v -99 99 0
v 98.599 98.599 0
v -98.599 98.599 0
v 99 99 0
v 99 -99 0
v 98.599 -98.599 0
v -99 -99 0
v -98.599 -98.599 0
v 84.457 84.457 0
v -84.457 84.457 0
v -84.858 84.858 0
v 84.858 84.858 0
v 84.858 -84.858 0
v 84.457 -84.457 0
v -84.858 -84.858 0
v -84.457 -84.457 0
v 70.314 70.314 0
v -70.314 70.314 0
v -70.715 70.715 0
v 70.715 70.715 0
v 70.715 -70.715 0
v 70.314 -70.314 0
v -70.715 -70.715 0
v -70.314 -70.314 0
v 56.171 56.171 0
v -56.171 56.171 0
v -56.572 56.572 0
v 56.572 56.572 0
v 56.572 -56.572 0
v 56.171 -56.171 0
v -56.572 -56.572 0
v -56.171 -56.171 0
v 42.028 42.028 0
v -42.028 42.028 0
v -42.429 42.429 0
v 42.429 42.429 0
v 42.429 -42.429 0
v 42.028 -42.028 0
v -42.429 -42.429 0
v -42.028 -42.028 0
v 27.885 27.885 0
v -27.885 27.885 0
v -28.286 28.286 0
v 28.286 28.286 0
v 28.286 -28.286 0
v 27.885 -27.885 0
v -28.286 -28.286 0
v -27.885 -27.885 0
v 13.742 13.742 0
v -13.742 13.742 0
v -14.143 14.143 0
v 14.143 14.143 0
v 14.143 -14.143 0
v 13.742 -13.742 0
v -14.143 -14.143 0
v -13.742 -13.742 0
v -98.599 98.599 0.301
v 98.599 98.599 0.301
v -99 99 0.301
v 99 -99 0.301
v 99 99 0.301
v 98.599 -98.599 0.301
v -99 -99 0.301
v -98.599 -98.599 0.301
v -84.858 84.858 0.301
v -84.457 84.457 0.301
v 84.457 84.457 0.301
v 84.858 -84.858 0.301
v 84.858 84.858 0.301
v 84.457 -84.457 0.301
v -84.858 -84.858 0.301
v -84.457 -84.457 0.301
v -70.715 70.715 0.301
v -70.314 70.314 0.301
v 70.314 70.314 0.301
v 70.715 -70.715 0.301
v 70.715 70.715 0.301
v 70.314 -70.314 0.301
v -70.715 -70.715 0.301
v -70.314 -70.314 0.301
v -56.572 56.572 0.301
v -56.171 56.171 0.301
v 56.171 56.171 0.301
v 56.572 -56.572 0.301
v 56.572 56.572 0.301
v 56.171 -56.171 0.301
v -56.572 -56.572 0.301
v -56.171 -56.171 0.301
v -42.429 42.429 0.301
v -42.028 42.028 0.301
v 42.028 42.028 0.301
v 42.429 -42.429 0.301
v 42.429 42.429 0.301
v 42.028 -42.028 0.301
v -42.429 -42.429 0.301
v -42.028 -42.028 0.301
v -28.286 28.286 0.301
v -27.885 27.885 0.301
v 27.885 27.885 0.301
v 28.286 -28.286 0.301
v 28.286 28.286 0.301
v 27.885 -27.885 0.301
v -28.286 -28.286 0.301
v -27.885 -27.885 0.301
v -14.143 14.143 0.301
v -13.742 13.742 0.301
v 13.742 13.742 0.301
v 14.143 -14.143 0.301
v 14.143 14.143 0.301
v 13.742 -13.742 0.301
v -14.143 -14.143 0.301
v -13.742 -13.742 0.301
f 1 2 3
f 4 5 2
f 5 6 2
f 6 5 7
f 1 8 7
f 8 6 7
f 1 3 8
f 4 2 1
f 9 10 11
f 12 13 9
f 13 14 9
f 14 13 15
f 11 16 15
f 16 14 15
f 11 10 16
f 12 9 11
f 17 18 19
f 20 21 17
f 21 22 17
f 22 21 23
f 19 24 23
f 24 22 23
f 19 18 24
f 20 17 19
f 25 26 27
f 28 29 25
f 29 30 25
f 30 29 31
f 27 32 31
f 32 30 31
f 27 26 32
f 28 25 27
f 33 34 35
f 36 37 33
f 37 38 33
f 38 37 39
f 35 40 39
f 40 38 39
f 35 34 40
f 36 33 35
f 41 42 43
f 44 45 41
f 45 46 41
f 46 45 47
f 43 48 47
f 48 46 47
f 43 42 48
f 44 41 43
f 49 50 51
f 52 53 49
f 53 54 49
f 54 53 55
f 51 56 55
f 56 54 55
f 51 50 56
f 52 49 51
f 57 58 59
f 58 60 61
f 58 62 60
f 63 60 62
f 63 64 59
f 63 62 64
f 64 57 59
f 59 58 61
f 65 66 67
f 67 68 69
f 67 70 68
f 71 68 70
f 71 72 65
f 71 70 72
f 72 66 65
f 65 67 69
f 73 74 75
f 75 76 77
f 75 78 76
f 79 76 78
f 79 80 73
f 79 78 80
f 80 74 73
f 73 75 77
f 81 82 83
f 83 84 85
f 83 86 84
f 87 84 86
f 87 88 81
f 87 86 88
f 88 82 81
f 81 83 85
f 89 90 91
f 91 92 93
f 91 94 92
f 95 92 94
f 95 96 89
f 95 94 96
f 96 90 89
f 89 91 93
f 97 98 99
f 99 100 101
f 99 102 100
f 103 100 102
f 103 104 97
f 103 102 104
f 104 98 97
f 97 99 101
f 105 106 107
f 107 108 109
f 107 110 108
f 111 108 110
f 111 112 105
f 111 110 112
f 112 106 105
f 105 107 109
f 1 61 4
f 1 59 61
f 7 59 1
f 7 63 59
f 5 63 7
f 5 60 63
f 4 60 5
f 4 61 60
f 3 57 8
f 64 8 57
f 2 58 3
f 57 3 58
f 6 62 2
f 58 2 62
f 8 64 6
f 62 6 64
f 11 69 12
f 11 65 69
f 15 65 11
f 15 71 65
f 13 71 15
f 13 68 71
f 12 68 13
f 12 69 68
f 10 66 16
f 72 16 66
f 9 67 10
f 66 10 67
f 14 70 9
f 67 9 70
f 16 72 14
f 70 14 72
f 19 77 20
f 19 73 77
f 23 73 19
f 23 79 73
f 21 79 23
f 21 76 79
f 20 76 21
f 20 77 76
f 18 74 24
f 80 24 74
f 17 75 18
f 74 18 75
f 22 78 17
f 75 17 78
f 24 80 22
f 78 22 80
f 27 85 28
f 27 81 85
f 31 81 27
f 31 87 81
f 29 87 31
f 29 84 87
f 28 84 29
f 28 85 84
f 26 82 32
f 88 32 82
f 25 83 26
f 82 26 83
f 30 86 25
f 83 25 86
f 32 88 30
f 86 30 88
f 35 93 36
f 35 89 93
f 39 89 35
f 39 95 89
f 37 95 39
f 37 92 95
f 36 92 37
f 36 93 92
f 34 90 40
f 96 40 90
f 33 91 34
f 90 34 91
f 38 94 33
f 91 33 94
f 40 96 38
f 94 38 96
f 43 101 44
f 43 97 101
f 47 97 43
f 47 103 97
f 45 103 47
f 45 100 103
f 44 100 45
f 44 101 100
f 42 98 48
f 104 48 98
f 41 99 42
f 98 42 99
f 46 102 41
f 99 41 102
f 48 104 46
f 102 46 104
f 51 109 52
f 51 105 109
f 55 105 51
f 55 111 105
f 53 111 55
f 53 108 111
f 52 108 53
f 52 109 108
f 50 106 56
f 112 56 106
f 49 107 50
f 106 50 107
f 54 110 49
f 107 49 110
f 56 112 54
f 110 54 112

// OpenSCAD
// These bed level test patterns are inspired by this All3DP article here: https://all3dp.com/2/ender-3-pro-bed-leveling-gcode/

/* [General Parameters] */
// The type of bed level pattern to generate
Bed_Level_Pattern_Type = "concentric squares"; // ["concentric squares", "x in square", "circle in square", "perimeter", "grid", "five circles"]

// The width of the bed print area
Print_Area_Width = 220.001;

// The depth of the bed print area
Print_Area_Depth = 220.001;

// The width of the lines to print
Line_Width = 0.401;

// The height of the lines to print
Line_Height = 0.301;

// The percentage of the print area to use for the bed level pattern
Fill_Percentage = 90; // [50: 100]



/* [Bed Level Pattern-Specific Parameters] */
// The number of square to generate for the concentric squares bed level pattern
Concentric_Ring_Count = 7;

// The number of grids (horizontal and vertical) to generate for the grid bed level pattern
Grid_Cell_Count = 4;

// The diameter of the circles to generate for the five circles pattern
Circle_Diameter = 20;

// The distance of the five circles pattern outline from the corner circles
Outline_Distance = 5;



/* [Advanced Parameters] */
// Quality value (higher numbers mean better quality, lower numbers mean faster rendering)
Quality_Value = 128;



/* [Development Parameters] */
// Highlight the print area?
Show_Print_Area = false;

// Orient the model for creating a screenshot?
Orient_for_Screenshot = false;

// The viewport distance for the screenshot 
Screenshot_Vpd = 400.00;

// The viewport field of view for the screenshot
Screenshot_Vpf = 22.50;

// The viewport rotation for the screenshot
Screenshot_Vpr = [ 60.00, 0.00, 300.00 ];

// The viewport translation for the screenshot
Screenshot_Vpt = [ 0.00, -5.00, -16.00 ];



$fn = Quality_Value;



module Generate_Model()
{
    Pattern_Width = Print_Area_Width * (Fill_Percentage/100);
    Pattern_Depth = Print_Area_Depth * (Fill_Percentage/100);



    // This is a generalization of OpenSCAD's circle function
    // If the diameter (d) or radius (r) is a single number, a circle will be drawn
    // If d or r are lists [x, y], an oval will be drawn instead
    module oval(d=1, r=undef)
    {
        diameterX = r == undef 
            ? is_list(d) ? d.x : d
            : is_list(r) ? r.x*2 : r*2;
        diameterY = r == undef 
            ? is_list(d) ? d.y : d
            : is_list(r) ? r.y*2 : r*2;

        diameterCircle = max(diameterX, diameterY);

        resize([diameterX, diameterY])
            circle(d=diameterCircle);
    }



    // Draws an oval outline
    module outlined_oval(thickness=1, d=1, r=undef)
    {
        diameterX = r == undef 
            ? is_list(d) ? d.x : d
            : is_list(r) ? r.x*2 : r*2;
        diameterY = r == undef 
            ? is_list(d) ? d.y : d
            : is_list(r) ? r.y*2 : r*2;

        difference()
        {
            oval(d=[diameterX, diameterY]);
            oval(d=[diameterX-thickness*2, diameterY-thickness*2]);
        }
    }


    // Draws a rectangular outline
    module outlined_square(dimensions=1, thickness=1, center=false)
    {
        width = is_list(dimensions) ? dimensions.x : x;
        height = is_list(dimensions) ? dimensions.y : y;

        difference()
        {
            square([width, height], center=center);
            square([width - thickness*2, height - thickness*2], center=center);
        }
    }



    // This is the best name I could come up with for this shape
    // Good luck understanding the code. It's difficult to explain without pictures
    module curved_x_pattern(size=1, thickness=1, cd=1, cr=undef)
    {
        module generate_intersection_shape(x, y)
        {
            points = 
            [
                [0, 0],
                [x + y, 0],
                [0, x + y],
            ];
            polygon(points=points);
        }

        module generate_corner(x, y, corner_radius, thickness)
        {
            difference()
            {
                translate([x, y])
                    outlined_oval(r=corner_radius, thickness);
                generate_intersection_shape(x, y);
            }
        }

        module generate_corners(x, y, corner_radius, thickness)
        {
            for (x_mirror = [0, 1])
            for (y_mirror = [0, 1])
            mirror([x_mirror, 0])
            mirror([0, y_mirror])
                generate_corner(x, y, corner_radius, thickness);
        }

        module generate_side(x, y, corner_radius, thickness)
        {
            side_radius = y * sqrt(2) - corner_radius + thickness;

            intersection()
            {
                translate([x + y, 0])
                    outlined_oval(r=side_radius, thickness);
                generate_intersection_shape(x, y);
            }
        }

        module generate_sides(x, y, corner_radius, thickness)
        {
            for (x_mirror = [0, 1])
            for (y_mirror = [0, 1])
            mirror([x_mirror, 0])
            mirror([0, y_mirror])
            {
                generate_side(x, y, corner_radius, thickness);
                rotate([0, 0, 90])
                    generate_side(y, x, corner_radius, thickness);
            }
        }

        width = is_list(size) ? size.x : size;
        height = is_list(size) ? size.y : size;
        corner_radius = cr == undef ? cd/2 : cr;
        corner_x = width/2 - corner_radius;
        corner_y = height/2 - corner_radius;

        generate_corners(corner_x, corner_y, corner_radius, thickness);
        generate_sides(corner_x, corner_y, corner_radius, thickness);
    }



    module Generate_Concentric_Squares()
    {
        width_delta = Pattern_Width/Concentric_Ring_Count;
        depth_delta = Pattern_Depth/Concentric_Ring_Count;

        for (ring_number = [0 : Concentric_Ring_Count - 1])
        {
            ring_width = width_delta * (ring_number + 1);
            ring_depth = depth_delta * (ring_number + 1);

            outlined_square([ring_width, ring_depth], Line_Width, center=true);
        }
    }


    
    module Generate_X_In_Square()
    {
        outlined_square([Pattern_Width, Pattern_Depth], Line_Width, center=true);

        // Calculate the angle and length of the diagonal lines
        angle = atan2(Pattern_Depth, Pattern_Width);
        length = sqrt(pow(Pattern_Width, 2) + pow(Pattern_Depth, 2));

        intersection()
        {
            // Generate each line in the x
            for (z_rot = [angle, -angle])
            rotate([0, 0, z_rot])
                square([length, Line_Width], center=true);

            square([Pattern_Width, Pattern_Depth], center=true);
        }
    }



    module Generate_Circle_In_Square()
    {
        outlined_square([Pattern_Width, Pattern_Depth], Line_Width, center=true);
        outlined_oval(d=[Pattern_Width, Pattern_Depth], Line_Width);
    }



    module Generate_Perimeter()
    {
        outlined_square([Pattern_Width, Pattern_Depth], Line_Width, center=true);
    }



    module Generate_Grid()
    {
        // Horizontal lines
        for (section_number = [0 : Grid_Cell_Count - 1])
        {
            section_width = Pattern_Width/Grid_Cell_Count;
            section_height = Pattern_Depth;
            x_offset = -Pattern_Width/2 + section_width * section_number + section_width/2;
            y_offset = 0;

            translate([x_offset, y_offset])
                outlined_square([section_width, section_height], Line_Width, center=true);
        }

        // Vertical lines
        for (section_number = [0 : Grid_Cell_Count - 1])
        {
            section_width = Pattern_Width;
            section_height = Pattern_Depth/Grid_Cell_Count;
            x_offset = 0;
            y_offset = -Pattern_Depth/2 + section_height * section_number + section_height/2;

            translate([x_offset, y_offset])
                outlined_square([section_width, section_height], Line_Width, center=true);
        }
    }



    module Generate_Five_Circles()
    {
        width = Pattern_Width;
        height = Pattern_Depth;
        corner_radius = Circle_Diameter/2 + Outline_Distance;
        corner_x = width/2 - corner_radius;
        corner_y = height/2 - corner_radius;

        // Filled circle in the center
        circle(d=Circle_Diameter);

        // Filled circles near the four corners
        for (x_mirror = [0, 1])
        for (y_mirror = [0, 1])
        mirror([x_mirror, 0])
        mirror([0, y_mirror])
        translate([corner_x, corner_y])
        {
            circle(d=Circle_Diameter);
        }

        // Generate the curved outline around the five circles
        curved_x_pattern([width, height], Line_Width, cr=corner_radius);
    }



    module Generate()
    {
        linear_extrude(Line_Height)
        {
            if (Bed_Level_Pattern_Type == "concentric squares")
            {
                Generate_Concentric_Squares();
            }
            else if (Bed_Level_Pattern_Type == "x in square")
            {
                Generate_X_In_Square();
            }
            else if (Bed_Level_Pattern_Type == "circle in square")
            {
                Generate_Circle_In_Square();
            }
            else if (Bed_Level_Pattern_Type == "perimeter")
            {
                Generate_Perimeter();
            }
            else if (Bed_Level_Pattern_Type == "grid")
            {
                Generate_Grid();
            }
            else if (Bed_Level_Pattern_Type == "five circles")
            {
                Generate_Five_Circles();
            }
        }
    }



    Generate();

    if (Show_Print_Area)
    {
        %square([Print_Area_Width, Print_Area_Depth], center=true);
    }
}



// Generate the model
Generate_Model();

// Orient the viewport
$vpd = Orient_for_Screenshot ? Screenshot_Vpd : $vpd;
$vpf = Orient_for_Screenshot ? Screenshot_Vpf : $vpf;
$vpr = Orient_for_Screenshot ? Screenshot_Vpr : $vpr;
$vpt = Orient_for_Screenshot ? Screenshot_Vpt : $vpt;
